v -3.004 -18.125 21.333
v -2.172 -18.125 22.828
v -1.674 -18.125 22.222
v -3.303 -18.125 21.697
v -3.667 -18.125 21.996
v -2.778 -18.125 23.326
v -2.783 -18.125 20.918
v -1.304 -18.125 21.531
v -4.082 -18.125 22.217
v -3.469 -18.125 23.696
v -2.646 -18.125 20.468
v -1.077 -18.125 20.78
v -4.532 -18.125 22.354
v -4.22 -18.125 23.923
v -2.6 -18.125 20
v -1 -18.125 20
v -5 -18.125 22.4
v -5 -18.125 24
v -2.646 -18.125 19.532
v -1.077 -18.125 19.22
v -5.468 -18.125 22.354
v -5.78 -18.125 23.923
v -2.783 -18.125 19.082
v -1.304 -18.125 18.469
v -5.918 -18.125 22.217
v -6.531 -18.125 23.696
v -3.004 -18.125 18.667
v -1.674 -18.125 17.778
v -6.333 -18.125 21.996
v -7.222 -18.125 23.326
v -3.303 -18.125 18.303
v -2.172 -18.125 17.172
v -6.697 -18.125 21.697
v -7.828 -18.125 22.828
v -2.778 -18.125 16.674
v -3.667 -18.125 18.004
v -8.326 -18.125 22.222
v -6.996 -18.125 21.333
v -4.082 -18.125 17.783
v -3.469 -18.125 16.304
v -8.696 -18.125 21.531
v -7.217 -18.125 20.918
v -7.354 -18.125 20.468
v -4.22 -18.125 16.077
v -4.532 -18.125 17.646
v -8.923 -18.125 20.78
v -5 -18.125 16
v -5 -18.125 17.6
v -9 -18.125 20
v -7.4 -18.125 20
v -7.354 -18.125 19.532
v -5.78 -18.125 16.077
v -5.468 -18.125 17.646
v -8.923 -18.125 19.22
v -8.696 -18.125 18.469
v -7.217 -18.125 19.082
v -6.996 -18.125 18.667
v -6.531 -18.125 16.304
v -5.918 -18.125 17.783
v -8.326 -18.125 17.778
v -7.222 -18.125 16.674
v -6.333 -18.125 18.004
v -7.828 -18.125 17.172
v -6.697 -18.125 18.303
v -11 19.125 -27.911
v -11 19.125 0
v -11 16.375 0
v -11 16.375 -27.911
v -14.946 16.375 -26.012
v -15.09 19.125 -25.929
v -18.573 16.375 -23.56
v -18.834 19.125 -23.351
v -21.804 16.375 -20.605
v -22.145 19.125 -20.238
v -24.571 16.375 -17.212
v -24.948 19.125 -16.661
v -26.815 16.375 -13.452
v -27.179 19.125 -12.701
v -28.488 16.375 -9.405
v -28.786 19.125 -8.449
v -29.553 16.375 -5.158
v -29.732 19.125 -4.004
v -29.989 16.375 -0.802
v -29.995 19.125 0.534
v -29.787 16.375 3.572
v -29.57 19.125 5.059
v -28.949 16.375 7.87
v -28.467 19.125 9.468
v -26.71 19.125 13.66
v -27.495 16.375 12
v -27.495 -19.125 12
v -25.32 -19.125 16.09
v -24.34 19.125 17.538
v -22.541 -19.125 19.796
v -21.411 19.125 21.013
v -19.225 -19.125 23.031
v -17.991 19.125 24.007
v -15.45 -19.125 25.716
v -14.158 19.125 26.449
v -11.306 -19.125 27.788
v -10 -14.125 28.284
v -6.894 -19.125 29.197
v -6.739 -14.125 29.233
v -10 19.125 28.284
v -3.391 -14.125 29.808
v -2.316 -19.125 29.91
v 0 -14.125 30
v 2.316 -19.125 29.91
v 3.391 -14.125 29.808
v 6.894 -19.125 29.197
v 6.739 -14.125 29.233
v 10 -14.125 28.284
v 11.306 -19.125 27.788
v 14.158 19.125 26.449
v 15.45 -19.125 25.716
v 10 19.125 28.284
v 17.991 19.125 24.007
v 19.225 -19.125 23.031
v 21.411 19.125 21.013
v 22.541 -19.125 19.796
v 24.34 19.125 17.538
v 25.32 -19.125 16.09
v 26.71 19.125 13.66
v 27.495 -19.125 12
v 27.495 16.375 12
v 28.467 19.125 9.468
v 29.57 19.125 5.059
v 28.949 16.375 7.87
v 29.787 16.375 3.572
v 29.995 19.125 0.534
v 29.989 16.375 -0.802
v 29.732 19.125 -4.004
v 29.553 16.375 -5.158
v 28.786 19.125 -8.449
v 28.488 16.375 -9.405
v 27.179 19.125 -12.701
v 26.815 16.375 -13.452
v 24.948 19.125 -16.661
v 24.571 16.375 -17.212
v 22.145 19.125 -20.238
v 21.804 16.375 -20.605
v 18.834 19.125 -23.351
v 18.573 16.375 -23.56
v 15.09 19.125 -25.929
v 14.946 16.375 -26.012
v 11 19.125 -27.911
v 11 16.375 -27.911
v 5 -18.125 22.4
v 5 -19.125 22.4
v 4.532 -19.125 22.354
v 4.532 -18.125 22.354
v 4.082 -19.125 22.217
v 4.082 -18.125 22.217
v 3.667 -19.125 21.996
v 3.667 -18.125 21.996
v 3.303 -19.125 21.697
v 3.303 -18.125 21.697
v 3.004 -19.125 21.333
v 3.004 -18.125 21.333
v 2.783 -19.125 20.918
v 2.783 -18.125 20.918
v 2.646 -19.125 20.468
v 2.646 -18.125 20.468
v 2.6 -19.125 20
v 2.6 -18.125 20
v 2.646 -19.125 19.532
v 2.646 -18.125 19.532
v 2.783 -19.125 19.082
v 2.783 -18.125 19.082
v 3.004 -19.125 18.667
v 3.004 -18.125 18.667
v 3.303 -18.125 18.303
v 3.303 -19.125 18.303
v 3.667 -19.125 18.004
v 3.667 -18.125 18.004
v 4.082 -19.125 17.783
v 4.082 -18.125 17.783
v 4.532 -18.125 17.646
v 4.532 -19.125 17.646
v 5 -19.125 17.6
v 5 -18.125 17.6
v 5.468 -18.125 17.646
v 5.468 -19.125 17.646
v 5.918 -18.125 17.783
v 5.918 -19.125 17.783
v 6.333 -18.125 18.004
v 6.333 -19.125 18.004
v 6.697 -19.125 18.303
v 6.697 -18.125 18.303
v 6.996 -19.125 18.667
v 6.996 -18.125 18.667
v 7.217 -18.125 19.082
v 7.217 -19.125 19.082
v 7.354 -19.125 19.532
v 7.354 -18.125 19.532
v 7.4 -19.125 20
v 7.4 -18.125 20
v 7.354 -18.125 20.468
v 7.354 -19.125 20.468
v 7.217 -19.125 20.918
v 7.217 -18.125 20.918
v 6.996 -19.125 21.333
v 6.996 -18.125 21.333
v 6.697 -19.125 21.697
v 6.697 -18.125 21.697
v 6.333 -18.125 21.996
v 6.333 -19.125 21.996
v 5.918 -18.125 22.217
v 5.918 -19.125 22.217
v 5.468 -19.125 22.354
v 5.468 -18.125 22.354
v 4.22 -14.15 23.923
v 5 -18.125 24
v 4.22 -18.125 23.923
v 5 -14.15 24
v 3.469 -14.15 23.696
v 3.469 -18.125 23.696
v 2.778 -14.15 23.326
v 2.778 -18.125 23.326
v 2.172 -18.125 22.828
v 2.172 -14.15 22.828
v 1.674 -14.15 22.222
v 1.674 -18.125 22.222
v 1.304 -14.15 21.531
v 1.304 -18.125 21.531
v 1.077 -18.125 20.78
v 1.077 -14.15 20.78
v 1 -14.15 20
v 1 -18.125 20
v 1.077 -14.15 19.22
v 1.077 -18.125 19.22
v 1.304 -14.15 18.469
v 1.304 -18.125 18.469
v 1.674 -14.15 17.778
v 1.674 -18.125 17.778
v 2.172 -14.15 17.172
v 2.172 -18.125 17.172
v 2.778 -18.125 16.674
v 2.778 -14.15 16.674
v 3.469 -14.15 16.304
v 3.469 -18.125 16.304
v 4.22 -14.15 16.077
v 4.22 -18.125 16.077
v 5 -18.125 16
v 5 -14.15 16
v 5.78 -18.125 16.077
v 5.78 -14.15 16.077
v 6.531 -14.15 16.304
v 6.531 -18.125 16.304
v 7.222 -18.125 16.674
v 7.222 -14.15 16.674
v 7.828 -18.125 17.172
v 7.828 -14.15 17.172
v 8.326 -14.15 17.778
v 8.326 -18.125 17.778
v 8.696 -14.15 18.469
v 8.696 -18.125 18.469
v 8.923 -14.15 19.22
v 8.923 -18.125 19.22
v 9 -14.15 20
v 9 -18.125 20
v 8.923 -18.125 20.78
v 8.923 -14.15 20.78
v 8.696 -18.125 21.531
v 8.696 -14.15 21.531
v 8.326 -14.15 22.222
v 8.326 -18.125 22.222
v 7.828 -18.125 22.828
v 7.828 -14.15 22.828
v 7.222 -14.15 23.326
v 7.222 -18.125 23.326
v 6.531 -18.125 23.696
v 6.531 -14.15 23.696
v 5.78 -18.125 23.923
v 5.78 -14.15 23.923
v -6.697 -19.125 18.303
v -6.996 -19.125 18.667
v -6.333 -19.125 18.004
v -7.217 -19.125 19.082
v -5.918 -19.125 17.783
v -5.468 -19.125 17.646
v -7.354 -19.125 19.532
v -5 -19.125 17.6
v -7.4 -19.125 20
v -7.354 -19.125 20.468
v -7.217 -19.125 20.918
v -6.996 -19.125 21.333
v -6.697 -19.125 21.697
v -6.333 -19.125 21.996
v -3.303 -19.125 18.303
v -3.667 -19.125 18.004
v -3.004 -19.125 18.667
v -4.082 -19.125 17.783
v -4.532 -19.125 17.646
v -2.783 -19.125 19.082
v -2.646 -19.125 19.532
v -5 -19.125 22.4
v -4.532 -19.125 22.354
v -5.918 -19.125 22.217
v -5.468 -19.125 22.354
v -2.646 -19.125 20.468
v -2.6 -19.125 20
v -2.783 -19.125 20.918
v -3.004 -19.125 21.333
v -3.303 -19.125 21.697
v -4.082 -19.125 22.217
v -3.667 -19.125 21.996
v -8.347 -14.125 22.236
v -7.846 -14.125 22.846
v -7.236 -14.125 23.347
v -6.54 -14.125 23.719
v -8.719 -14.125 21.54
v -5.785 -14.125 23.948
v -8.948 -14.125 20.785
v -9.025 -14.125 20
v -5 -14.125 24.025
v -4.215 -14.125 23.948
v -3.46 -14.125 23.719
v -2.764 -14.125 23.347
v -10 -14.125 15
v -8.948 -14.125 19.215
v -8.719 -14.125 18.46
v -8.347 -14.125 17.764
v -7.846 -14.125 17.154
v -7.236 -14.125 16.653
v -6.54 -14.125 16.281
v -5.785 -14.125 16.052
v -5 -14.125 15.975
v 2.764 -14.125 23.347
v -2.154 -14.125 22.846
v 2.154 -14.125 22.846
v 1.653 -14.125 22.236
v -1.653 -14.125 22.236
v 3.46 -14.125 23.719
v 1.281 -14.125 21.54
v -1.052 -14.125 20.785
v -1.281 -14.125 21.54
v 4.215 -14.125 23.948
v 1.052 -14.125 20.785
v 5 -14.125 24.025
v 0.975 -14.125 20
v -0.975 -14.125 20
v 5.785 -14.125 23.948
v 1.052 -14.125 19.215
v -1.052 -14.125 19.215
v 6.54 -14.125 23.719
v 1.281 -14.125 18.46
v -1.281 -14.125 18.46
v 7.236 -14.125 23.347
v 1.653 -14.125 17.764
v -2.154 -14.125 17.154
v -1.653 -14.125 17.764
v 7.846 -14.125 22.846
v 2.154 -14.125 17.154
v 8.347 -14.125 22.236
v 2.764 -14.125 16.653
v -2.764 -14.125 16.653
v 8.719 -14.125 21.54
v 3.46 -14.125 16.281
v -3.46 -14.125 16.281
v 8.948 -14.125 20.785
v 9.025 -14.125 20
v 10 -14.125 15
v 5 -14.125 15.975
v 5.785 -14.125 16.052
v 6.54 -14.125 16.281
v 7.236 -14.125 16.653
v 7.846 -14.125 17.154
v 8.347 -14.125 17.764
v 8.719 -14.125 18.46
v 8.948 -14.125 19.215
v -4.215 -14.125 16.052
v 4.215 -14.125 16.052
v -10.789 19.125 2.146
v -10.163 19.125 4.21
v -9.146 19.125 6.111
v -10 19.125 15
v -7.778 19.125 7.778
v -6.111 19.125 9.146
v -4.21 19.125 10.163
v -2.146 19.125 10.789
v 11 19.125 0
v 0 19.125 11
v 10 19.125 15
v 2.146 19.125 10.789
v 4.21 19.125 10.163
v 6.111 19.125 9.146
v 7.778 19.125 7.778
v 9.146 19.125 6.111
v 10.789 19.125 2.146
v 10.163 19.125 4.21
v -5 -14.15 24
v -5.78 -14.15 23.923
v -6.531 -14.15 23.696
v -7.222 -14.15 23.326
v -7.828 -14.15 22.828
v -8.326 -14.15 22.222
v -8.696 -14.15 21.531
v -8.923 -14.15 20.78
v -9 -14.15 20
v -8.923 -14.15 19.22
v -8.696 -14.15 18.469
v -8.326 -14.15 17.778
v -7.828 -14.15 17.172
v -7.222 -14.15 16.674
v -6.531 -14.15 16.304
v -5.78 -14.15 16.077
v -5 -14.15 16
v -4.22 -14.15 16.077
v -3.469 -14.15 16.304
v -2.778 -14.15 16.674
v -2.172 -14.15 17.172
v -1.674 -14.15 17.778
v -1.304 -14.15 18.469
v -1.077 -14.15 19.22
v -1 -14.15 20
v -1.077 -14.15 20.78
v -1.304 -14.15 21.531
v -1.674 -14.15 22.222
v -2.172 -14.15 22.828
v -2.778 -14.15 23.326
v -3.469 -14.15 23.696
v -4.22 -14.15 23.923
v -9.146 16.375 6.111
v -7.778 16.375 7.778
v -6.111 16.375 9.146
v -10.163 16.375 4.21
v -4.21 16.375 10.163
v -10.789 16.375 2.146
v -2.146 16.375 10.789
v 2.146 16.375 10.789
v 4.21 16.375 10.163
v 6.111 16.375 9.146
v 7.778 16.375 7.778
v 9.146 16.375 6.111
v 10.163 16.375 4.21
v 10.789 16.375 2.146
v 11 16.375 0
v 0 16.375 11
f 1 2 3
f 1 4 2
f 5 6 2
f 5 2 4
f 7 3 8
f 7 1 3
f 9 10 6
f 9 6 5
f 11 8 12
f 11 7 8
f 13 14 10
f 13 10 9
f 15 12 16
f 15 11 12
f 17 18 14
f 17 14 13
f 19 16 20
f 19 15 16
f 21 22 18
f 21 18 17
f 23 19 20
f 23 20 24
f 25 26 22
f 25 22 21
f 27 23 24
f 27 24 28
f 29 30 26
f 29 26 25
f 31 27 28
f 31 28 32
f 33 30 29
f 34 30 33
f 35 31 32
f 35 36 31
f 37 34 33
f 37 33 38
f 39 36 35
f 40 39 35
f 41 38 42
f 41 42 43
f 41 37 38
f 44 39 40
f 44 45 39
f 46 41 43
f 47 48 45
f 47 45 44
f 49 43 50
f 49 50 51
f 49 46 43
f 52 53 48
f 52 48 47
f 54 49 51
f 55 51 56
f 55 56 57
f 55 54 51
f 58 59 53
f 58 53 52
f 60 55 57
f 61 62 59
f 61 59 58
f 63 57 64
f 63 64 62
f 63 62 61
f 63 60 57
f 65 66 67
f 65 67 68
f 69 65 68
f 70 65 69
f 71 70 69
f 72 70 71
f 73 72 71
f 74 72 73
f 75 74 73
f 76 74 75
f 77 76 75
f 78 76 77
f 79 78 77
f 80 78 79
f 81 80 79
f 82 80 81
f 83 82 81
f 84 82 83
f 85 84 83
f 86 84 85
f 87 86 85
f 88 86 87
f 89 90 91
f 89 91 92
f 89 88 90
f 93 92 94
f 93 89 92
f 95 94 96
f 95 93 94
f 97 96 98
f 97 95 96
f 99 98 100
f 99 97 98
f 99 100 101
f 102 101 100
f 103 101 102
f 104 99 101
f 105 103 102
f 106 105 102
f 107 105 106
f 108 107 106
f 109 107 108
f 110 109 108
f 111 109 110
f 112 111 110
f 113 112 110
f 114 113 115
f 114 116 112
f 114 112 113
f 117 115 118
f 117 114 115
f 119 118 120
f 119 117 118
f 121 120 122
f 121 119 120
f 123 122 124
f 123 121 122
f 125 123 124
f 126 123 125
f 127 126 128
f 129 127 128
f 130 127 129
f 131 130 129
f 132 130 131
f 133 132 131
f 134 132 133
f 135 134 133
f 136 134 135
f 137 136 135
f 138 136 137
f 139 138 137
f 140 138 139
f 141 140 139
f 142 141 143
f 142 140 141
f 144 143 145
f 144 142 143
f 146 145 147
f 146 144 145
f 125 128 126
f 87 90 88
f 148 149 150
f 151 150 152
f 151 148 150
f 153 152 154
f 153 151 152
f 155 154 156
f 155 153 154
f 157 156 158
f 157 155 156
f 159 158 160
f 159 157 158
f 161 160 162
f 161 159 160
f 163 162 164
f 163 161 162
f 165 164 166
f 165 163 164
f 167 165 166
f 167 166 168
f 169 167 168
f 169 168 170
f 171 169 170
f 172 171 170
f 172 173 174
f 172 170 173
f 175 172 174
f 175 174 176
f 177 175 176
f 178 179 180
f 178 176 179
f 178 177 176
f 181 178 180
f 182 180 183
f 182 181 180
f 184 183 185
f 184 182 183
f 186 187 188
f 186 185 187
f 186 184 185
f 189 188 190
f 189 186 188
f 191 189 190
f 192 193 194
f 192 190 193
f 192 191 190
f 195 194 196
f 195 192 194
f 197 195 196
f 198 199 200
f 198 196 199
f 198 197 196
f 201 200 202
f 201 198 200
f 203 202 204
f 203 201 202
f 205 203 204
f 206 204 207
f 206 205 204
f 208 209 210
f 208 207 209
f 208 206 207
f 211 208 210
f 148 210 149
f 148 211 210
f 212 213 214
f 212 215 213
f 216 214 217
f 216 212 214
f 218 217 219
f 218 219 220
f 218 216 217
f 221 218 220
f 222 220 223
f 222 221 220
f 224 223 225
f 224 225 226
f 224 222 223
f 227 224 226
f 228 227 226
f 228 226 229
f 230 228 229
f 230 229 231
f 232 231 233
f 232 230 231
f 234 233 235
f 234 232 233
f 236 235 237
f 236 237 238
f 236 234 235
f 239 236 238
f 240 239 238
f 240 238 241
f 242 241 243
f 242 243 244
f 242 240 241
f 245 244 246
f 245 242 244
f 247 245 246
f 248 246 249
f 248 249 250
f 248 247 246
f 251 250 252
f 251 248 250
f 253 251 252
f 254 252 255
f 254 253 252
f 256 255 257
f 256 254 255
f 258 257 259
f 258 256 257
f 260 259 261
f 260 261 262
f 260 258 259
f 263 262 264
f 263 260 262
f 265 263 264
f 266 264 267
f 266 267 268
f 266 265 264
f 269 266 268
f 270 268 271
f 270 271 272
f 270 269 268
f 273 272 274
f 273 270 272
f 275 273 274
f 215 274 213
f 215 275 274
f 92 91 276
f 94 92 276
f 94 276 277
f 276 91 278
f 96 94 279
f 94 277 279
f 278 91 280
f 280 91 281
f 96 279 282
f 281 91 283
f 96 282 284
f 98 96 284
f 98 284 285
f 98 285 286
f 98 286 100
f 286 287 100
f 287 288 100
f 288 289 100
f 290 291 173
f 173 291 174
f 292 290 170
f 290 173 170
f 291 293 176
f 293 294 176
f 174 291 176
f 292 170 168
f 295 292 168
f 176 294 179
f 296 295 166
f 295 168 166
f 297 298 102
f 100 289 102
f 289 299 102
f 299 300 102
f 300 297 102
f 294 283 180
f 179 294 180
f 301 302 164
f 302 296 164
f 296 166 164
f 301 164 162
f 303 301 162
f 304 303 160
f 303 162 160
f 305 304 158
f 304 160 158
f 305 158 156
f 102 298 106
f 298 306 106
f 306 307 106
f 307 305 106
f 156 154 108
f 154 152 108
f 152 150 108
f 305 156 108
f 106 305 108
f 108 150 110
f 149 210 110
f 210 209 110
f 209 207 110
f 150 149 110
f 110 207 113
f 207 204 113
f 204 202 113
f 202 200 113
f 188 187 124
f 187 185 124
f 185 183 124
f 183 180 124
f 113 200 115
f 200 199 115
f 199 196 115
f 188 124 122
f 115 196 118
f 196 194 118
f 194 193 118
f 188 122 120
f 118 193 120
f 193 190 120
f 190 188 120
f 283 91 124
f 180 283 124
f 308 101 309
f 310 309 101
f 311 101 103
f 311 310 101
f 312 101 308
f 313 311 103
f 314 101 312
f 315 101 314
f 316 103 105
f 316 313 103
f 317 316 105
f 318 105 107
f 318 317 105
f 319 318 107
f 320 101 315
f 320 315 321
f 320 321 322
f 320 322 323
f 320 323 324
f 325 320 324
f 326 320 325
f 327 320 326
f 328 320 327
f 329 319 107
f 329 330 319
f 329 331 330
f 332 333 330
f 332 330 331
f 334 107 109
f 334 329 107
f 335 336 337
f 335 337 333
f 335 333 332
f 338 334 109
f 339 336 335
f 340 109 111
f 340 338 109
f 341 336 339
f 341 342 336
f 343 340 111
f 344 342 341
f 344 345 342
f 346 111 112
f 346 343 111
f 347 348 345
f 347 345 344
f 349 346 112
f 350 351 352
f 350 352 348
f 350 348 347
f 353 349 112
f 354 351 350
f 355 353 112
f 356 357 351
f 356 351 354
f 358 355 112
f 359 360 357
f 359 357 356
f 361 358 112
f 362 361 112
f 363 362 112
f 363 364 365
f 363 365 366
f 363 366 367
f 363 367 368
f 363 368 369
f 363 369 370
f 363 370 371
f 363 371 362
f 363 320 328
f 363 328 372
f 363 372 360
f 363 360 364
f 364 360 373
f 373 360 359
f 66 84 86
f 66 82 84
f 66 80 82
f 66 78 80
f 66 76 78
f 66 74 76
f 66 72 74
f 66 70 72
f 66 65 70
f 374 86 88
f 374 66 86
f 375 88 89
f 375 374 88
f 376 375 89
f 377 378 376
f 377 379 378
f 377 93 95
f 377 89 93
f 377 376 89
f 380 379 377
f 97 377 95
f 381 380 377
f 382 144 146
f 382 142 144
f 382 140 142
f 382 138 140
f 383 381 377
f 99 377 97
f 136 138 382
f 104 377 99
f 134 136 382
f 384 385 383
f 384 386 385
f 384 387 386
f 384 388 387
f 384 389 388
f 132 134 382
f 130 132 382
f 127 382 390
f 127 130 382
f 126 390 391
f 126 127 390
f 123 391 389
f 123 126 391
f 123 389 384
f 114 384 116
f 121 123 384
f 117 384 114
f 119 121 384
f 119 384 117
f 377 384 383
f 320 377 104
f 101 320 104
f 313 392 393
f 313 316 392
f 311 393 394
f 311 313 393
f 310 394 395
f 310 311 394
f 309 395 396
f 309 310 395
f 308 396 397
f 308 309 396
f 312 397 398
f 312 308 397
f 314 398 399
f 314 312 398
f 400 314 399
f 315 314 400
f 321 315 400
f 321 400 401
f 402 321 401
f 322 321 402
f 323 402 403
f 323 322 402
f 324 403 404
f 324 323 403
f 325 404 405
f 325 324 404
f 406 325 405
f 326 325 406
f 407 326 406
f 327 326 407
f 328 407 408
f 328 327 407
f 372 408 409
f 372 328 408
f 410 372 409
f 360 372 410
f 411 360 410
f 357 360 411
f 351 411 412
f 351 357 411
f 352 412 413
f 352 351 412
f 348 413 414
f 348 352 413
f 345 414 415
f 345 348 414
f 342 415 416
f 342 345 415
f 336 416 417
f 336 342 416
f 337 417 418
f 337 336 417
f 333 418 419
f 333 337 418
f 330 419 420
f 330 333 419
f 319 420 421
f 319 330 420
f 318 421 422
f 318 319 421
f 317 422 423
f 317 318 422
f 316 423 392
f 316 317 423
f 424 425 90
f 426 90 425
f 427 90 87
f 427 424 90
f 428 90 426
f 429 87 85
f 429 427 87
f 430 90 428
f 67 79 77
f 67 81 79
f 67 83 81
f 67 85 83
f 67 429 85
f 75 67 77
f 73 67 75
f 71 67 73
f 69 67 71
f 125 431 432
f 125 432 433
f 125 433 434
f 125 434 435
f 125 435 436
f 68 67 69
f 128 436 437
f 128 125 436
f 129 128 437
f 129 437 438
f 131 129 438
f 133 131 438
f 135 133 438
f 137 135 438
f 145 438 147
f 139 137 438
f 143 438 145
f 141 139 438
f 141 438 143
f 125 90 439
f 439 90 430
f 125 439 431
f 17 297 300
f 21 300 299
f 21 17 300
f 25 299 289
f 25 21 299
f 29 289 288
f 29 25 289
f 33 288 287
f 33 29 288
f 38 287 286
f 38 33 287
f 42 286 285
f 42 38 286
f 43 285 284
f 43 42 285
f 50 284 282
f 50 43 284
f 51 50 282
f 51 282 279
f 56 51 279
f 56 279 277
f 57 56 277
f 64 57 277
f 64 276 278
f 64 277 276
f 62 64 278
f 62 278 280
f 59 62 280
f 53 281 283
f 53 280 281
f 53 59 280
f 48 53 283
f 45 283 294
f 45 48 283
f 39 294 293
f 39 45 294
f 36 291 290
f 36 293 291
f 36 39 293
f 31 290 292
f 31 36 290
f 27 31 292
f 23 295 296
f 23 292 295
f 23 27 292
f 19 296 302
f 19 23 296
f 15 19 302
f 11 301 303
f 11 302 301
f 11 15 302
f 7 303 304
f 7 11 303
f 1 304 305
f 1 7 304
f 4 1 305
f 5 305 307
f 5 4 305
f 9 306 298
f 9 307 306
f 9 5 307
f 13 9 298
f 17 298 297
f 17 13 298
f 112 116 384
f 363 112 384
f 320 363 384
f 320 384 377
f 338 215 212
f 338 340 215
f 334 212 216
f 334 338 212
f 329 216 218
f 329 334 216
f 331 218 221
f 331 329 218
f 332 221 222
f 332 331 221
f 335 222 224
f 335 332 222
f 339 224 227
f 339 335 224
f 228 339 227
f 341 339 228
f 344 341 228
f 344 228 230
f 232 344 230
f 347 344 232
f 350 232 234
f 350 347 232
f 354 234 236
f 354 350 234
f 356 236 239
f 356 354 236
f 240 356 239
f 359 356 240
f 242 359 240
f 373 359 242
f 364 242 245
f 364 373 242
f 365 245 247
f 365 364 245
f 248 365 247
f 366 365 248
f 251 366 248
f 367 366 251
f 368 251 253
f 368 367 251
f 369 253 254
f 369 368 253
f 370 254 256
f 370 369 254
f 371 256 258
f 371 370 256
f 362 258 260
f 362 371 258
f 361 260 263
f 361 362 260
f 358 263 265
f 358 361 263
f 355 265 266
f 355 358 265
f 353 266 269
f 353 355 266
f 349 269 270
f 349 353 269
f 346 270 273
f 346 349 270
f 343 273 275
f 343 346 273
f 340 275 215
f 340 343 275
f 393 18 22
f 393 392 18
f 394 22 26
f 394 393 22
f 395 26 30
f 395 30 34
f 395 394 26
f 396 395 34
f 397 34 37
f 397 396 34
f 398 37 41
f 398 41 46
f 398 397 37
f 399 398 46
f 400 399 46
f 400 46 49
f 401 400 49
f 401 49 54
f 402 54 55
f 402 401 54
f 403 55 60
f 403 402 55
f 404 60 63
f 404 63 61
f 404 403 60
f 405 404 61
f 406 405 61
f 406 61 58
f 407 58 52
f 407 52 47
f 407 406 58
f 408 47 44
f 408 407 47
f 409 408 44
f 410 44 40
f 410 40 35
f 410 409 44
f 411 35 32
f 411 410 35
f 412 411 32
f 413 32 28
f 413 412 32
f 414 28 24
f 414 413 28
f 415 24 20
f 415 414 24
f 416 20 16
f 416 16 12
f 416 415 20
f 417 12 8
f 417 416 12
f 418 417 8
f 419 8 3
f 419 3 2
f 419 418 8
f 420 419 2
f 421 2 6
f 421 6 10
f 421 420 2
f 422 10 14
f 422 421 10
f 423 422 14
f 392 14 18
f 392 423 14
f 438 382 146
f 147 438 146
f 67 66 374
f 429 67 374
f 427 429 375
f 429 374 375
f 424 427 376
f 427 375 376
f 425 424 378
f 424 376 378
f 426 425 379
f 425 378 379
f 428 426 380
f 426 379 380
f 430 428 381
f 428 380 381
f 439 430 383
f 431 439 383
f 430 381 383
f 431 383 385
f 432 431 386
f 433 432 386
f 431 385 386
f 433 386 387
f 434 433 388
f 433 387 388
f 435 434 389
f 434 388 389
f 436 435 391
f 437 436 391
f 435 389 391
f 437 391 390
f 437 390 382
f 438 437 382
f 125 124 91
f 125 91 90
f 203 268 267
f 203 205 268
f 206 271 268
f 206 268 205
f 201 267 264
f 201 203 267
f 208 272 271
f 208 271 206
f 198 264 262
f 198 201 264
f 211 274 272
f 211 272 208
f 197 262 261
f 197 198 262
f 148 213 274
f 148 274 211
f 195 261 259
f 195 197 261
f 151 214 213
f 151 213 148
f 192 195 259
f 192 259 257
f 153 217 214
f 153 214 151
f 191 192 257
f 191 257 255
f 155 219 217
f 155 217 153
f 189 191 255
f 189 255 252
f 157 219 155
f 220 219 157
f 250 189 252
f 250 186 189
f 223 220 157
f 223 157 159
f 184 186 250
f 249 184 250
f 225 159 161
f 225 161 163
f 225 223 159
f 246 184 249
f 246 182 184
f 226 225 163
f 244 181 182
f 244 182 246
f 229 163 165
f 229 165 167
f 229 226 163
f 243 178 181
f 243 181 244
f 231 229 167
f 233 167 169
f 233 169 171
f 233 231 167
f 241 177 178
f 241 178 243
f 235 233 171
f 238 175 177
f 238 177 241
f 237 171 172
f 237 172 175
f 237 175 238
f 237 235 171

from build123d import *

# Parameters (mm, degrees)
SKETCH1_R                     = 30
BOSS_EXTRUDE1_DEPTH           = 19.125
SKETCH5_W                     = 42
SKETCH5_H                     = 35.5
CUT_EXTRUDE1_DEPTH            = 52.5
SKETCH7_R                     = 11
SKETCH7_W                     = 22
SKETCH7_H                     = 50
CUT_EXTRUDE3_DEPTH            = 52.5
CUT_EXTRUDE4_DEPTH            = 33.25
CBORE_FOR_M4_SHCS1_AT_2_COUNT = 2
CBORE_FOR_M4_SHCS1_AT_2_PITCH = 10


with BuildPart() as part:
    # Sketch1 → Boss-Extrude1 (new, symmetric)
    with BuildSketch(Plane(origin=(0, 0, 0), x_dir=(1, 0, 0), z_dir=(0, 1, 0))):
        with Locations(Location((0, 0, 0), (0, 0, 270))):
            Circle(SKETCH1_R)
    extrude(amount=BOSS_EXTRUDE1_DEPTH, both=True)

    # Sketch5 → Cut-Extrude1 (cut, symmetric)
    with BuildSketch(Plane(origin=(0, 0, 0), x_dir=(0, 0, -1), z_dir=(1, 0, 0))):
        with Locations((9, -1.375)):
            Rectangle(SKETCH5_W, SKETCH5_H)
    extrude(amount=CUT_EXTRUDE1_DEPTH, both=True, mode=Mode.SUBTRACT)

    # Sketch7 → Cut-Extrude3 (cut, symmetric)
    with BuildSketch(Plane(origin=(0, 19.125, 0), x_dir=(1, 0, 0), z_dir=(0, 1, 0))):
        Circle(SKETCH7_R)
        with Locations((0, 25)):
            Rectangle(SKETCH7_W, SKETCH7_H)
    extrude(amount=CUT_EXTRUDE3_DEPTH, both=True, mode=Mode.SUBTRACT)

    # Sketch8 → Cut-Extrude4 (cut)
    with BuildSketch(Plane(origin=(0, 19.125, 0), x_dir=(1, 0, 0), z_dir=(0, 1, 0))):
        with BuildLine():
            Line((10, -28.284271247), (10, -15))
            Line((10, -15), (-10, -15))
            Line((-10, -15), (-10, -28.284271247))
            ThreePointArc((-10, -28.284271247), (-5.073059353, -29.567956791), (1.8e-08, -30))
            ThreePointArc((1.8e-08, -30), (5.07305937, -29.567956788), (10, -28.284271247))
        make_face()
    extrude(amount=-CUT_EXTRUDE4_DEPTH, mode=Mode.SUBTRACT)

    # Sketch11 → CBORE for M4 SHCS1 (revolve, cut)
    with BuildSketch(Plane(origin=(-5, -14.125, 20), x_dir=(0, 0, 1), z_dir=(1, 0, 0))):
        Polygon((0, 0), (0, 7.442065486), (2.4, 6), (2.4, 4), (4, 4), (4, 0.025), (4.025, 0), align=None)
    cbore_for_m4_shcs1 = revolve(axis=Axis((-5, -7.775, 20), (0, -1, 0)), mode=Mode.SUBTRACT)

    # CBORE for M4 SHCS1 at 2: CBORE for M4 SHCS1 ×2
    with Locations(*[(i * CBORE_FOR_M4_SHCS1_AT_2_PITCH, 0, 0) for i in range(1, CBORE_FOR_M4_SHCS1_AT_2_COUNT)]):
        add(cbore_for_m4_shcs1, mode=Mode.SUBTRACT)


solid = part.part
